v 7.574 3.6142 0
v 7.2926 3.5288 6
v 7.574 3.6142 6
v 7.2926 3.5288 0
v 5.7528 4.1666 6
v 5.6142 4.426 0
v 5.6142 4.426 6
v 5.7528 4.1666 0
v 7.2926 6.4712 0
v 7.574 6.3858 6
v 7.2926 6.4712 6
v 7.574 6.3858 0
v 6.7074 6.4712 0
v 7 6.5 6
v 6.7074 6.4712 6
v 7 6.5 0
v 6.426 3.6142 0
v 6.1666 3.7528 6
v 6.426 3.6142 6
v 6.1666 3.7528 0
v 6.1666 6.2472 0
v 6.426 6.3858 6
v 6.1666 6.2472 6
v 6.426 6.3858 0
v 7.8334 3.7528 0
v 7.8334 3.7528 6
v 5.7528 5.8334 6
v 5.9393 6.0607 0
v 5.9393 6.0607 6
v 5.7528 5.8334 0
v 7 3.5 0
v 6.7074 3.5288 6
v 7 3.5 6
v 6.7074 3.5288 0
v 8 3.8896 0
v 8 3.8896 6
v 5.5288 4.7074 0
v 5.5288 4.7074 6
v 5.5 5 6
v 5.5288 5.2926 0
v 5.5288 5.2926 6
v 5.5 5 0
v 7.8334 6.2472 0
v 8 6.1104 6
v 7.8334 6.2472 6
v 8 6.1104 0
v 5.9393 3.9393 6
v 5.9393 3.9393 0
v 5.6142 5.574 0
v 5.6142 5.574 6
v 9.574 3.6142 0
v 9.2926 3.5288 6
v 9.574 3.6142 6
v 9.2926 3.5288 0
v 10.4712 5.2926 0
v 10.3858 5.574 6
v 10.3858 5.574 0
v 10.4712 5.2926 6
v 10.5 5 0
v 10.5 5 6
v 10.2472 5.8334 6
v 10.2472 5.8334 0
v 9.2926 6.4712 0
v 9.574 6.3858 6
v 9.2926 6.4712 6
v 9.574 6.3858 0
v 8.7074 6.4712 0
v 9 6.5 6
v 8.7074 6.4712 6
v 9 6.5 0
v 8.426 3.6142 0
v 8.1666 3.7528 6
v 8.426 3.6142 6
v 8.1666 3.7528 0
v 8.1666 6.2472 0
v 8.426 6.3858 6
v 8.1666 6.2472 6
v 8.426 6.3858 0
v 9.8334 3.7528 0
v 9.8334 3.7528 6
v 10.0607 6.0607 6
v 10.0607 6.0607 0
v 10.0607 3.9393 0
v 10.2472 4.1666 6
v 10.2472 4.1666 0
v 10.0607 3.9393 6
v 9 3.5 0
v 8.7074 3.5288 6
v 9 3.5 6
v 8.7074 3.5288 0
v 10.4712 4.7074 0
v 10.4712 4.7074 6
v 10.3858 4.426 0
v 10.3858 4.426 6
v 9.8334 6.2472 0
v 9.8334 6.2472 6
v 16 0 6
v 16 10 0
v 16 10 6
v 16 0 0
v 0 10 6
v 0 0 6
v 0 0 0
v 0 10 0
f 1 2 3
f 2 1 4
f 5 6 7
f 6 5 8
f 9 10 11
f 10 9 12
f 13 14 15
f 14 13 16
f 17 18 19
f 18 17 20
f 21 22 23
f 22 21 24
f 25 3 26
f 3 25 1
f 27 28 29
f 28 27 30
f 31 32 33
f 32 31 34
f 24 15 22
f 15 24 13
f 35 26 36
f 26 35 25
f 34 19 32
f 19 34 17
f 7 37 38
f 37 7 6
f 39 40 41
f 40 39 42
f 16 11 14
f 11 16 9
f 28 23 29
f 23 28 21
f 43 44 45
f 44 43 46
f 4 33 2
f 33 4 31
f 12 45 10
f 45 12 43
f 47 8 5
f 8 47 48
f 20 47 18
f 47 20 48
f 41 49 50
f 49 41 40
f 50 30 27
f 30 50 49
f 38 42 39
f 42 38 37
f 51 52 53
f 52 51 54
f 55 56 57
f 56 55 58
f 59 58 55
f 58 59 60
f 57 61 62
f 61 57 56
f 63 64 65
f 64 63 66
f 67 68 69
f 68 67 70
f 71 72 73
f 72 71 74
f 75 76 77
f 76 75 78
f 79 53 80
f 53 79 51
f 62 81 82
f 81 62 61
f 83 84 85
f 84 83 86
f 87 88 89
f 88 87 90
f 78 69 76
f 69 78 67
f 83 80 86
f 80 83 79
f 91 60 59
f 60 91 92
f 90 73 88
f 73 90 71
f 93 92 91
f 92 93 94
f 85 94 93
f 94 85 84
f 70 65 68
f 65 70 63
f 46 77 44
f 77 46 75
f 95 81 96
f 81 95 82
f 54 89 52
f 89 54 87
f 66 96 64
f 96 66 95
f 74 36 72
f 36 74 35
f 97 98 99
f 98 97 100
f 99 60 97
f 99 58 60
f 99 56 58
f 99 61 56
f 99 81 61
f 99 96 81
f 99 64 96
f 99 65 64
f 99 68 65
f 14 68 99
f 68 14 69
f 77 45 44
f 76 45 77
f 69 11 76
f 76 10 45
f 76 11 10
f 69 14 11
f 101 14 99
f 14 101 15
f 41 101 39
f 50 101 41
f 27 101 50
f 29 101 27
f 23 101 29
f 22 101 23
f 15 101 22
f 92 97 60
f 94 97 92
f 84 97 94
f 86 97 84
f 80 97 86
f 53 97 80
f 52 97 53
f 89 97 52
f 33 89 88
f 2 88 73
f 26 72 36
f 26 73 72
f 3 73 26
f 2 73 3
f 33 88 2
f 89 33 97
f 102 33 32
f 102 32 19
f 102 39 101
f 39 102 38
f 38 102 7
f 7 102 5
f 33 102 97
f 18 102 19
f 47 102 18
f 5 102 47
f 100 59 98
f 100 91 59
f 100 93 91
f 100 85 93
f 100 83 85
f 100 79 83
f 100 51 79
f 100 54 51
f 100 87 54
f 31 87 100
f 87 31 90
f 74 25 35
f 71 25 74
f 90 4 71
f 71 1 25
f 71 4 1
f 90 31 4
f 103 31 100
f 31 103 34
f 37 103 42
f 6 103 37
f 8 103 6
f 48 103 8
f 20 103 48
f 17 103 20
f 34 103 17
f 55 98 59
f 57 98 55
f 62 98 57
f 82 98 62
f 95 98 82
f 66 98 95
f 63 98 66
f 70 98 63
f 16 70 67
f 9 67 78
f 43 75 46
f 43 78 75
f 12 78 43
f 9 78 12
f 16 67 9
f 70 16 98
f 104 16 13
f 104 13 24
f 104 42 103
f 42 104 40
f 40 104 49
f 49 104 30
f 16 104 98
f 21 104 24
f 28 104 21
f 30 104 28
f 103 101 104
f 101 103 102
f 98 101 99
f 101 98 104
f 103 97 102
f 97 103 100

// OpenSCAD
$fn = 32;

// ----------------------------------------------------------------------
// Micro pad: two-hole pad, 5-20 mm class
// ----------------------------------------------------------------------

// --- parameters (mm) ---
pad_l = 16;               // pad length, X
pad_w = 10;               // pad width, Y
pad_t = 6;                // pad thickness, Z
hole_d = 3;               // hole diameter
hole_x = 7;               // X of the first hole centre

difference() {
  cube([pad_l, pad_w, pad_t]);
  for (x = [hole_x, pad_l - hole_x])
    translate([x, pad_w / 2, -1])
      cylinder(h = pad_t + 2, d = hole_d);
}
